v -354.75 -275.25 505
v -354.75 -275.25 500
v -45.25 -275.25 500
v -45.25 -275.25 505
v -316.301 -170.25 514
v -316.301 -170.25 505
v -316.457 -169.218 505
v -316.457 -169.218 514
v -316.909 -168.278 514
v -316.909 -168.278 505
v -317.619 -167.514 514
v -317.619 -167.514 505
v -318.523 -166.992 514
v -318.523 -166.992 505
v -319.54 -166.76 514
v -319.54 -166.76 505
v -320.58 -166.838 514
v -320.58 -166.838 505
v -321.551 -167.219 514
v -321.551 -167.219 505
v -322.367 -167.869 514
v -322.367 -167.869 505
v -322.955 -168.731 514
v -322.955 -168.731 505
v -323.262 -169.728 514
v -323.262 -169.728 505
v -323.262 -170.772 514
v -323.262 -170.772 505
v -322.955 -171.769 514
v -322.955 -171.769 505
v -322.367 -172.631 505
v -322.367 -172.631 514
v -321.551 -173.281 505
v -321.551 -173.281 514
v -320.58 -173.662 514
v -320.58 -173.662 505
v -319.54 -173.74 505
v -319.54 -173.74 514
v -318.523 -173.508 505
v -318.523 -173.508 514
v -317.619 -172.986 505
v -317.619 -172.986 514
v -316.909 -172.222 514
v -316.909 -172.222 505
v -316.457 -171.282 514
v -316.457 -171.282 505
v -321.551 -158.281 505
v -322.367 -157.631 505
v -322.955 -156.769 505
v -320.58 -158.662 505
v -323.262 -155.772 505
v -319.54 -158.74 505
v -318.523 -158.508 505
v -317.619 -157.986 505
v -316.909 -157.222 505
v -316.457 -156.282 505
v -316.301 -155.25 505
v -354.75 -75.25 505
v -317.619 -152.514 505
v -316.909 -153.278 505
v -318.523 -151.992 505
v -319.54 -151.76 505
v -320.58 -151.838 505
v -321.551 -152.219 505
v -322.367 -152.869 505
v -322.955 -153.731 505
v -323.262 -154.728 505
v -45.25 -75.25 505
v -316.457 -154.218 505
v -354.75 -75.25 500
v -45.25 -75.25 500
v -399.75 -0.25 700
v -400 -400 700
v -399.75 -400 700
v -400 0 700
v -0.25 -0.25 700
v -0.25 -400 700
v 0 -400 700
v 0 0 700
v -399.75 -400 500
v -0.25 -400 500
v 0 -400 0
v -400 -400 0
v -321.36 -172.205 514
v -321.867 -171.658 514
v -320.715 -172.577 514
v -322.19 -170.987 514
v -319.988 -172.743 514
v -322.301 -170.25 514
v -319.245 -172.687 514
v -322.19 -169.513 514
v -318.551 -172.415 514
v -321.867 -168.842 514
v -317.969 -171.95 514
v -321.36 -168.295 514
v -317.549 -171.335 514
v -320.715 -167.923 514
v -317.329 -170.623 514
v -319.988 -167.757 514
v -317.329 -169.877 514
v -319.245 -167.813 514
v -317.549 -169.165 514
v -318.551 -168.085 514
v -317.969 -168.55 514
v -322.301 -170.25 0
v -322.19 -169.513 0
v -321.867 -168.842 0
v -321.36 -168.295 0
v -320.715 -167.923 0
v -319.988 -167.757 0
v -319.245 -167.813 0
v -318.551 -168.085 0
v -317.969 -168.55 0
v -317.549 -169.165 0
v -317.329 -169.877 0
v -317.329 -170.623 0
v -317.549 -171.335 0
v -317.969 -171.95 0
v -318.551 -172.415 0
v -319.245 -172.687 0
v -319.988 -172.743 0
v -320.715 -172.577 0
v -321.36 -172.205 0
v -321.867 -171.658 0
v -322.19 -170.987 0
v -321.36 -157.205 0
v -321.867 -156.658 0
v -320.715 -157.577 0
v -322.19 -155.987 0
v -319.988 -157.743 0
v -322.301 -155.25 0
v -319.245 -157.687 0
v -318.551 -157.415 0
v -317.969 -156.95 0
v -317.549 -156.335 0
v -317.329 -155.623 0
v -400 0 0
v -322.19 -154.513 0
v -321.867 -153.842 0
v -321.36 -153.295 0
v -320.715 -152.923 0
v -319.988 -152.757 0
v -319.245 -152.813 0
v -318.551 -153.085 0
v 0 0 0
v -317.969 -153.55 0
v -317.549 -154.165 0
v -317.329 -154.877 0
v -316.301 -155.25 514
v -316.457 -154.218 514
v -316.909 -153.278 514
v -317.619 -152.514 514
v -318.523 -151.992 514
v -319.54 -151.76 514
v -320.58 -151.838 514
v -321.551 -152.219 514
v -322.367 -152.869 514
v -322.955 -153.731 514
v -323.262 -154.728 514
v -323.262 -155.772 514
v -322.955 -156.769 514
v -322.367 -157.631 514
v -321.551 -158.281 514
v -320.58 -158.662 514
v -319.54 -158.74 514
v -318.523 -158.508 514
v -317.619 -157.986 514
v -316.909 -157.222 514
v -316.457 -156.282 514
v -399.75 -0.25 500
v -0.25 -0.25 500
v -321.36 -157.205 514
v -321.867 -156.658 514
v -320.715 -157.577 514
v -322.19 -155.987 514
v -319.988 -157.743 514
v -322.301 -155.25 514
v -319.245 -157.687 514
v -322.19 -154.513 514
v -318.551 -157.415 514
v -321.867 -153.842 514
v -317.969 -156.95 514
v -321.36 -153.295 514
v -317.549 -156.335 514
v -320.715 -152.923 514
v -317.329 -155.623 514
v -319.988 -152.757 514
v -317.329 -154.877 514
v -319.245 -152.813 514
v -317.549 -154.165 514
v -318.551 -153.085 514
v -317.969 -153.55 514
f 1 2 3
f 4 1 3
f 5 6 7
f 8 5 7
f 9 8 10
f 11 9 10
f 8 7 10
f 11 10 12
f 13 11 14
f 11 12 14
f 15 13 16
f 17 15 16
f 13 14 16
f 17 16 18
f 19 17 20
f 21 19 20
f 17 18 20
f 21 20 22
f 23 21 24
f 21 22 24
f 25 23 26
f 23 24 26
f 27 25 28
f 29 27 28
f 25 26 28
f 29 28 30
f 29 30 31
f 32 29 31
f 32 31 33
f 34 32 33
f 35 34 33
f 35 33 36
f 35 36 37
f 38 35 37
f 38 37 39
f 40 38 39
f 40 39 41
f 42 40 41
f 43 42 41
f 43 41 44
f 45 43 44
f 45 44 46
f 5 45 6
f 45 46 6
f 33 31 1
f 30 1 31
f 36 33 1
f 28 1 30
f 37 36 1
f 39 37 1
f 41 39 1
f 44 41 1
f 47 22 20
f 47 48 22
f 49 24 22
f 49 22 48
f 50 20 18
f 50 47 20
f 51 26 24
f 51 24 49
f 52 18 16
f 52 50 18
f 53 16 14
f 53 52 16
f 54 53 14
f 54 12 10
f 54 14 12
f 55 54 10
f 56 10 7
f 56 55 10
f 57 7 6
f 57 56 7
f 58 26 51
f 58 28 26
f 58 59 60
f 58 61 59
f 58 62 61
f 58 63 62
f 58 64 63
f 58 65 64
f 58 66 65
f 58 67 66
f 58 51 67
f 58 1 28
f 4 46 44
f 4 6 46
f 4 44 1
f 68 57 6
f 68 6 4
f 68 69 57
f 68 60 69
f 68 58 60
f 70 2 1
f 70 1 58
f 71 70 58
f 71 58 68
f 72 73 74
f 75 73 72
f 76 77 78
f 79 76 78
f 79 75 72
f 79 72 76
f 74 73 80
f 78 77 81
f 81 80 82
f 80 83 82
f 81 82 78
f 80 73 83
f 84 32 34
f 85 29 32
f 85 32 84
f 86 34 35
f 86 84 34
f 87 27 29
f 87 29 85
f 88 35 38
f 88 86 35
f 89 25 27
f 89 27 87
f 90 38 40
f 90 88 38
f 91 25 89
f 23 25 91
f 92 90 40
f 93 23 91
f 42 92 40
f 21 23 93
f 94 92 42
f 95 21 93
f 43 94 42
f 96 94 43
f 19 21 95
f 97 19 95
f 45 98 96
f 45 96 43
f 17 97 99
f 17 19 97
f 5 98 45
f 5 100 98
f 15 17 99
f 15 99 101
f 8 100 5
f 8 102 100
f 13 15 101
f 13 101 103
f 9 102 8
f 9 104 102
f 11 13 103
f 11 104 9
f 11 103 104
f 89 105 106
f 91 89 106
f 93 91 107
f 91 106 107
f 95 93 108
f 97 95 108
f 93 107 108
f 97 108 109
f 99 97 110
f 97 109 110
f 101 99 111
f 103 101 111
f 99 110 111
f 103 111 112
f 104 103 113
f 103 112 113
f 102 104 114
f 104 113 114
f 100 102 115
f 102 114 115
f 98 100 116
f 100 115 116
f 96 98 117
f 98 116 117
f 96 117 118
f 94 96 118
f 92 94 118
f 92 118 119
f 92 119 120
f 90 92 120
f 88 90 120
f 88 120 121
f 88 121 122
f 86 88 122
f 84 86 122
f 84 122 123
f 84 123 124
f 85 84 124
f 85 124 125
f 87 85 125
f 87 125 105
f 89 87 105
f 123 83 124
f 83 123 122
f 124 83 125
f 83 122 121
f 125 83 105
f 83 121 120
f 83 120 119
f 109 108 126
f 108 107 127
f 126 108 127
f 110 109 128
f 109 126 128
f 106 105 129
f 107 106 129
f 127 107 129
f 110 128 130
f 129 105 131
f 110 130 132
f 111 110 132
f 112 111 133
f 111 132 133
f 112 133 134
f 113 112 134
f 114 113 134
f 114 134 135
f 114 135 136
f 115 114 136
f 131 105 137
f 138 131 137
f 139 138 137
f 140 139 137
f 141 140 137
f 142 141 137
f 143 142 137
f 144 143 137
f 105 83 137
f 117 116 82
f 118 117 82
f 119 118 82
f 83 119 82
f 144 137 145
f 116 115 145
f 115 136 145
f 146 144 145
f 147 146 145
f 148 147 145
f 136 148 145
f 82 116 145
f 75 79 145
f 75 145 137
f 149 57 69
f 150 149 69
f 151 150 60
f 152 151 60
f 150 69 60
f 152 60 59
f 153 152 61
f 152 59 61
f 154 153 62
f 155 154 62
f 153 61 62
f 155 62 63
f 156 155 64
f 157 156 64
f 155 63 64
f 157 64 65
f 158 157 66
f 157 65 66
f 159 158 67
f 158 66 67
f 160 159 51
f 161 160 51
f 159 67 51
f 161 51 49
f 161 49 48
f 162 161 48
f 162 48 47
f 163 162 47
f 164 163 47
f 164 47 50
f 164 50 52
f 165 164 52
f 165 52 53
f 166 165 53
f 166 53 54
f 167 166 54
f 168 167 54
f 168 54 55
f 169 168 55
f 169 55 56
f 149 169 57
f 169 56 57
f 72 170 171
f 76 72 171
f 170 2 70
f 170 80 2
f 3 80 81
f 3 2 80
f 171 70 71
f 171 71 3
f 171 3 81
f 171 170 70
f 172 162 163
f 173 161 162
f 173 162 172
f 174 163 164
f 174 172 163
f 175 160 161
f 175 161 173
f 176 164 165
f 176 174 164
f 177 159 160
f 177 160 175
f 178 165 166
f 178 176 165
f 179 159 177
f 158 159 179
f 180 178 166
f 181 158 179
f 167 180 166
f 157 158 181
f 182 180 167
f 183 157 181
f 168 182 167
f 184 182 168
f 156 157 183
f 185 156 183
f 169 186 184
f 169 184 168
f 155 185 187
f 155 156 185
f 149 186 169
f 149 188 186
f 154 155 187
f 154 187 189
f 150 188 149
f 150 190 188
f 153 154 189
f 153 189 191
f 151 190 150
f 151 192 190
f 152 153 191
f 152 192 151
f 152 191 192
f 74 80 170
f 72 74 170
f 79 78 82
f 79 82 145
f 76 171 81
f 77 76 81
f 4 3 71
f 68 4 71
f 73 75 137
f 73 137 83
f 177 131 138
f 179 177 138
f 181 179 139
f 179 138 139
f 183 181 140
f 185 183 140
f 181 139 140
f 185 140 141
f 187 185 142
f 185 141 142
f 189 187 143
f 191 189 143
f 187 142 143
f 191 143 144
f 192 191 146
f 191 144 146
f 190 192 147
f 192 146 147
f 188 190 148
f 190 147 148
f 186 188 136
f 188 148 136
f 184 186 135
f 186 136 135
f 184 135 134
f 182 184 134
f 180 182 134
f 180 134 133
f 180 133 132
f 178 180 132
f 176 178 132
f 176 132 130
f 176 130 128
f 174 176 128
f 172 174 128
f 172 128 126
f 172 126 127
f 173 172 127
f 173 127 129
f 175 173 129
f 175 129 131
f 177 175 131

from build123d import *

# Parameters (mm, degrees)
F0_W     = 400
F0_H     = 500
F1_DEPTH = 400
F3_DEPTH = 200
F4_W     = 309.5
F4_H     = 200
F5_DEPTH = 1
F6_DEPTH = 5
F8_R     = 3.5
F9_DEPTH = 9
F11_D    = 5
F13_D    = 5


with BuildPart() as f1:
    # F0 (on Front) → F1 (new body)
    with BuildSketch(Plane.XZ):
        with Locations((-200, 250)):
            Rectangle(F0_W, F0_H)
    extrude(amount=F1_DEPTH)

    # F2 (on face) → F3 (join)
    with BuildSketch(Plane.XY.offset(500)):
        Polygon((-399.75, 0), (-400, 0), (-400, -0.25), (-400, -400), (-399.75, -400), (-399.75, -0.25), (-0.25, -0.25), (-0.25, -400), (0, -400), (0, -0.25), (0, 0), (-0.25, 0), align=None)
    extrude(amount=F3_DEPTH)

    # F4 (on face) → F5 (join)
    with BuildSketch(Plane.XY.offset(500)):
        with Locations((-200, -175.25)):
            Rectangle(F4_W, F4_H)
    extrude(amount=F5_DEPTH)

    # F4 (on face) → F6 (join)
    with BuildSketch(Plane.XY.offset(500)):
        with Locations((-200, -175.25)):
            Rectangle(F4_W, F4_H)
    extrude(amount=F6_DEPTH)

    # F8 (on face) → F9 (join)
    with BuildSketch(Plane.XY.offset(505)):
        with Locations((-319.801312, -155.25)):
            Circle(F8_R)
        with Locations((-319.801312, -170.25)):
            Circle(F8_R)
    extrude(amount=F9_DEPTH)

    # F11 (through all)
    with Locations(Plane.XY.offset(514)):
        with Locations((-319.801312, -155.25)):
            Hole(F11_D / 2)

    # F13 (through all)
    with Locations(Plane.XY.offset(514)):
        with Locations((-319.801312, -170.25)):
            Hole(F13_D / 2)


solid = f1.part
